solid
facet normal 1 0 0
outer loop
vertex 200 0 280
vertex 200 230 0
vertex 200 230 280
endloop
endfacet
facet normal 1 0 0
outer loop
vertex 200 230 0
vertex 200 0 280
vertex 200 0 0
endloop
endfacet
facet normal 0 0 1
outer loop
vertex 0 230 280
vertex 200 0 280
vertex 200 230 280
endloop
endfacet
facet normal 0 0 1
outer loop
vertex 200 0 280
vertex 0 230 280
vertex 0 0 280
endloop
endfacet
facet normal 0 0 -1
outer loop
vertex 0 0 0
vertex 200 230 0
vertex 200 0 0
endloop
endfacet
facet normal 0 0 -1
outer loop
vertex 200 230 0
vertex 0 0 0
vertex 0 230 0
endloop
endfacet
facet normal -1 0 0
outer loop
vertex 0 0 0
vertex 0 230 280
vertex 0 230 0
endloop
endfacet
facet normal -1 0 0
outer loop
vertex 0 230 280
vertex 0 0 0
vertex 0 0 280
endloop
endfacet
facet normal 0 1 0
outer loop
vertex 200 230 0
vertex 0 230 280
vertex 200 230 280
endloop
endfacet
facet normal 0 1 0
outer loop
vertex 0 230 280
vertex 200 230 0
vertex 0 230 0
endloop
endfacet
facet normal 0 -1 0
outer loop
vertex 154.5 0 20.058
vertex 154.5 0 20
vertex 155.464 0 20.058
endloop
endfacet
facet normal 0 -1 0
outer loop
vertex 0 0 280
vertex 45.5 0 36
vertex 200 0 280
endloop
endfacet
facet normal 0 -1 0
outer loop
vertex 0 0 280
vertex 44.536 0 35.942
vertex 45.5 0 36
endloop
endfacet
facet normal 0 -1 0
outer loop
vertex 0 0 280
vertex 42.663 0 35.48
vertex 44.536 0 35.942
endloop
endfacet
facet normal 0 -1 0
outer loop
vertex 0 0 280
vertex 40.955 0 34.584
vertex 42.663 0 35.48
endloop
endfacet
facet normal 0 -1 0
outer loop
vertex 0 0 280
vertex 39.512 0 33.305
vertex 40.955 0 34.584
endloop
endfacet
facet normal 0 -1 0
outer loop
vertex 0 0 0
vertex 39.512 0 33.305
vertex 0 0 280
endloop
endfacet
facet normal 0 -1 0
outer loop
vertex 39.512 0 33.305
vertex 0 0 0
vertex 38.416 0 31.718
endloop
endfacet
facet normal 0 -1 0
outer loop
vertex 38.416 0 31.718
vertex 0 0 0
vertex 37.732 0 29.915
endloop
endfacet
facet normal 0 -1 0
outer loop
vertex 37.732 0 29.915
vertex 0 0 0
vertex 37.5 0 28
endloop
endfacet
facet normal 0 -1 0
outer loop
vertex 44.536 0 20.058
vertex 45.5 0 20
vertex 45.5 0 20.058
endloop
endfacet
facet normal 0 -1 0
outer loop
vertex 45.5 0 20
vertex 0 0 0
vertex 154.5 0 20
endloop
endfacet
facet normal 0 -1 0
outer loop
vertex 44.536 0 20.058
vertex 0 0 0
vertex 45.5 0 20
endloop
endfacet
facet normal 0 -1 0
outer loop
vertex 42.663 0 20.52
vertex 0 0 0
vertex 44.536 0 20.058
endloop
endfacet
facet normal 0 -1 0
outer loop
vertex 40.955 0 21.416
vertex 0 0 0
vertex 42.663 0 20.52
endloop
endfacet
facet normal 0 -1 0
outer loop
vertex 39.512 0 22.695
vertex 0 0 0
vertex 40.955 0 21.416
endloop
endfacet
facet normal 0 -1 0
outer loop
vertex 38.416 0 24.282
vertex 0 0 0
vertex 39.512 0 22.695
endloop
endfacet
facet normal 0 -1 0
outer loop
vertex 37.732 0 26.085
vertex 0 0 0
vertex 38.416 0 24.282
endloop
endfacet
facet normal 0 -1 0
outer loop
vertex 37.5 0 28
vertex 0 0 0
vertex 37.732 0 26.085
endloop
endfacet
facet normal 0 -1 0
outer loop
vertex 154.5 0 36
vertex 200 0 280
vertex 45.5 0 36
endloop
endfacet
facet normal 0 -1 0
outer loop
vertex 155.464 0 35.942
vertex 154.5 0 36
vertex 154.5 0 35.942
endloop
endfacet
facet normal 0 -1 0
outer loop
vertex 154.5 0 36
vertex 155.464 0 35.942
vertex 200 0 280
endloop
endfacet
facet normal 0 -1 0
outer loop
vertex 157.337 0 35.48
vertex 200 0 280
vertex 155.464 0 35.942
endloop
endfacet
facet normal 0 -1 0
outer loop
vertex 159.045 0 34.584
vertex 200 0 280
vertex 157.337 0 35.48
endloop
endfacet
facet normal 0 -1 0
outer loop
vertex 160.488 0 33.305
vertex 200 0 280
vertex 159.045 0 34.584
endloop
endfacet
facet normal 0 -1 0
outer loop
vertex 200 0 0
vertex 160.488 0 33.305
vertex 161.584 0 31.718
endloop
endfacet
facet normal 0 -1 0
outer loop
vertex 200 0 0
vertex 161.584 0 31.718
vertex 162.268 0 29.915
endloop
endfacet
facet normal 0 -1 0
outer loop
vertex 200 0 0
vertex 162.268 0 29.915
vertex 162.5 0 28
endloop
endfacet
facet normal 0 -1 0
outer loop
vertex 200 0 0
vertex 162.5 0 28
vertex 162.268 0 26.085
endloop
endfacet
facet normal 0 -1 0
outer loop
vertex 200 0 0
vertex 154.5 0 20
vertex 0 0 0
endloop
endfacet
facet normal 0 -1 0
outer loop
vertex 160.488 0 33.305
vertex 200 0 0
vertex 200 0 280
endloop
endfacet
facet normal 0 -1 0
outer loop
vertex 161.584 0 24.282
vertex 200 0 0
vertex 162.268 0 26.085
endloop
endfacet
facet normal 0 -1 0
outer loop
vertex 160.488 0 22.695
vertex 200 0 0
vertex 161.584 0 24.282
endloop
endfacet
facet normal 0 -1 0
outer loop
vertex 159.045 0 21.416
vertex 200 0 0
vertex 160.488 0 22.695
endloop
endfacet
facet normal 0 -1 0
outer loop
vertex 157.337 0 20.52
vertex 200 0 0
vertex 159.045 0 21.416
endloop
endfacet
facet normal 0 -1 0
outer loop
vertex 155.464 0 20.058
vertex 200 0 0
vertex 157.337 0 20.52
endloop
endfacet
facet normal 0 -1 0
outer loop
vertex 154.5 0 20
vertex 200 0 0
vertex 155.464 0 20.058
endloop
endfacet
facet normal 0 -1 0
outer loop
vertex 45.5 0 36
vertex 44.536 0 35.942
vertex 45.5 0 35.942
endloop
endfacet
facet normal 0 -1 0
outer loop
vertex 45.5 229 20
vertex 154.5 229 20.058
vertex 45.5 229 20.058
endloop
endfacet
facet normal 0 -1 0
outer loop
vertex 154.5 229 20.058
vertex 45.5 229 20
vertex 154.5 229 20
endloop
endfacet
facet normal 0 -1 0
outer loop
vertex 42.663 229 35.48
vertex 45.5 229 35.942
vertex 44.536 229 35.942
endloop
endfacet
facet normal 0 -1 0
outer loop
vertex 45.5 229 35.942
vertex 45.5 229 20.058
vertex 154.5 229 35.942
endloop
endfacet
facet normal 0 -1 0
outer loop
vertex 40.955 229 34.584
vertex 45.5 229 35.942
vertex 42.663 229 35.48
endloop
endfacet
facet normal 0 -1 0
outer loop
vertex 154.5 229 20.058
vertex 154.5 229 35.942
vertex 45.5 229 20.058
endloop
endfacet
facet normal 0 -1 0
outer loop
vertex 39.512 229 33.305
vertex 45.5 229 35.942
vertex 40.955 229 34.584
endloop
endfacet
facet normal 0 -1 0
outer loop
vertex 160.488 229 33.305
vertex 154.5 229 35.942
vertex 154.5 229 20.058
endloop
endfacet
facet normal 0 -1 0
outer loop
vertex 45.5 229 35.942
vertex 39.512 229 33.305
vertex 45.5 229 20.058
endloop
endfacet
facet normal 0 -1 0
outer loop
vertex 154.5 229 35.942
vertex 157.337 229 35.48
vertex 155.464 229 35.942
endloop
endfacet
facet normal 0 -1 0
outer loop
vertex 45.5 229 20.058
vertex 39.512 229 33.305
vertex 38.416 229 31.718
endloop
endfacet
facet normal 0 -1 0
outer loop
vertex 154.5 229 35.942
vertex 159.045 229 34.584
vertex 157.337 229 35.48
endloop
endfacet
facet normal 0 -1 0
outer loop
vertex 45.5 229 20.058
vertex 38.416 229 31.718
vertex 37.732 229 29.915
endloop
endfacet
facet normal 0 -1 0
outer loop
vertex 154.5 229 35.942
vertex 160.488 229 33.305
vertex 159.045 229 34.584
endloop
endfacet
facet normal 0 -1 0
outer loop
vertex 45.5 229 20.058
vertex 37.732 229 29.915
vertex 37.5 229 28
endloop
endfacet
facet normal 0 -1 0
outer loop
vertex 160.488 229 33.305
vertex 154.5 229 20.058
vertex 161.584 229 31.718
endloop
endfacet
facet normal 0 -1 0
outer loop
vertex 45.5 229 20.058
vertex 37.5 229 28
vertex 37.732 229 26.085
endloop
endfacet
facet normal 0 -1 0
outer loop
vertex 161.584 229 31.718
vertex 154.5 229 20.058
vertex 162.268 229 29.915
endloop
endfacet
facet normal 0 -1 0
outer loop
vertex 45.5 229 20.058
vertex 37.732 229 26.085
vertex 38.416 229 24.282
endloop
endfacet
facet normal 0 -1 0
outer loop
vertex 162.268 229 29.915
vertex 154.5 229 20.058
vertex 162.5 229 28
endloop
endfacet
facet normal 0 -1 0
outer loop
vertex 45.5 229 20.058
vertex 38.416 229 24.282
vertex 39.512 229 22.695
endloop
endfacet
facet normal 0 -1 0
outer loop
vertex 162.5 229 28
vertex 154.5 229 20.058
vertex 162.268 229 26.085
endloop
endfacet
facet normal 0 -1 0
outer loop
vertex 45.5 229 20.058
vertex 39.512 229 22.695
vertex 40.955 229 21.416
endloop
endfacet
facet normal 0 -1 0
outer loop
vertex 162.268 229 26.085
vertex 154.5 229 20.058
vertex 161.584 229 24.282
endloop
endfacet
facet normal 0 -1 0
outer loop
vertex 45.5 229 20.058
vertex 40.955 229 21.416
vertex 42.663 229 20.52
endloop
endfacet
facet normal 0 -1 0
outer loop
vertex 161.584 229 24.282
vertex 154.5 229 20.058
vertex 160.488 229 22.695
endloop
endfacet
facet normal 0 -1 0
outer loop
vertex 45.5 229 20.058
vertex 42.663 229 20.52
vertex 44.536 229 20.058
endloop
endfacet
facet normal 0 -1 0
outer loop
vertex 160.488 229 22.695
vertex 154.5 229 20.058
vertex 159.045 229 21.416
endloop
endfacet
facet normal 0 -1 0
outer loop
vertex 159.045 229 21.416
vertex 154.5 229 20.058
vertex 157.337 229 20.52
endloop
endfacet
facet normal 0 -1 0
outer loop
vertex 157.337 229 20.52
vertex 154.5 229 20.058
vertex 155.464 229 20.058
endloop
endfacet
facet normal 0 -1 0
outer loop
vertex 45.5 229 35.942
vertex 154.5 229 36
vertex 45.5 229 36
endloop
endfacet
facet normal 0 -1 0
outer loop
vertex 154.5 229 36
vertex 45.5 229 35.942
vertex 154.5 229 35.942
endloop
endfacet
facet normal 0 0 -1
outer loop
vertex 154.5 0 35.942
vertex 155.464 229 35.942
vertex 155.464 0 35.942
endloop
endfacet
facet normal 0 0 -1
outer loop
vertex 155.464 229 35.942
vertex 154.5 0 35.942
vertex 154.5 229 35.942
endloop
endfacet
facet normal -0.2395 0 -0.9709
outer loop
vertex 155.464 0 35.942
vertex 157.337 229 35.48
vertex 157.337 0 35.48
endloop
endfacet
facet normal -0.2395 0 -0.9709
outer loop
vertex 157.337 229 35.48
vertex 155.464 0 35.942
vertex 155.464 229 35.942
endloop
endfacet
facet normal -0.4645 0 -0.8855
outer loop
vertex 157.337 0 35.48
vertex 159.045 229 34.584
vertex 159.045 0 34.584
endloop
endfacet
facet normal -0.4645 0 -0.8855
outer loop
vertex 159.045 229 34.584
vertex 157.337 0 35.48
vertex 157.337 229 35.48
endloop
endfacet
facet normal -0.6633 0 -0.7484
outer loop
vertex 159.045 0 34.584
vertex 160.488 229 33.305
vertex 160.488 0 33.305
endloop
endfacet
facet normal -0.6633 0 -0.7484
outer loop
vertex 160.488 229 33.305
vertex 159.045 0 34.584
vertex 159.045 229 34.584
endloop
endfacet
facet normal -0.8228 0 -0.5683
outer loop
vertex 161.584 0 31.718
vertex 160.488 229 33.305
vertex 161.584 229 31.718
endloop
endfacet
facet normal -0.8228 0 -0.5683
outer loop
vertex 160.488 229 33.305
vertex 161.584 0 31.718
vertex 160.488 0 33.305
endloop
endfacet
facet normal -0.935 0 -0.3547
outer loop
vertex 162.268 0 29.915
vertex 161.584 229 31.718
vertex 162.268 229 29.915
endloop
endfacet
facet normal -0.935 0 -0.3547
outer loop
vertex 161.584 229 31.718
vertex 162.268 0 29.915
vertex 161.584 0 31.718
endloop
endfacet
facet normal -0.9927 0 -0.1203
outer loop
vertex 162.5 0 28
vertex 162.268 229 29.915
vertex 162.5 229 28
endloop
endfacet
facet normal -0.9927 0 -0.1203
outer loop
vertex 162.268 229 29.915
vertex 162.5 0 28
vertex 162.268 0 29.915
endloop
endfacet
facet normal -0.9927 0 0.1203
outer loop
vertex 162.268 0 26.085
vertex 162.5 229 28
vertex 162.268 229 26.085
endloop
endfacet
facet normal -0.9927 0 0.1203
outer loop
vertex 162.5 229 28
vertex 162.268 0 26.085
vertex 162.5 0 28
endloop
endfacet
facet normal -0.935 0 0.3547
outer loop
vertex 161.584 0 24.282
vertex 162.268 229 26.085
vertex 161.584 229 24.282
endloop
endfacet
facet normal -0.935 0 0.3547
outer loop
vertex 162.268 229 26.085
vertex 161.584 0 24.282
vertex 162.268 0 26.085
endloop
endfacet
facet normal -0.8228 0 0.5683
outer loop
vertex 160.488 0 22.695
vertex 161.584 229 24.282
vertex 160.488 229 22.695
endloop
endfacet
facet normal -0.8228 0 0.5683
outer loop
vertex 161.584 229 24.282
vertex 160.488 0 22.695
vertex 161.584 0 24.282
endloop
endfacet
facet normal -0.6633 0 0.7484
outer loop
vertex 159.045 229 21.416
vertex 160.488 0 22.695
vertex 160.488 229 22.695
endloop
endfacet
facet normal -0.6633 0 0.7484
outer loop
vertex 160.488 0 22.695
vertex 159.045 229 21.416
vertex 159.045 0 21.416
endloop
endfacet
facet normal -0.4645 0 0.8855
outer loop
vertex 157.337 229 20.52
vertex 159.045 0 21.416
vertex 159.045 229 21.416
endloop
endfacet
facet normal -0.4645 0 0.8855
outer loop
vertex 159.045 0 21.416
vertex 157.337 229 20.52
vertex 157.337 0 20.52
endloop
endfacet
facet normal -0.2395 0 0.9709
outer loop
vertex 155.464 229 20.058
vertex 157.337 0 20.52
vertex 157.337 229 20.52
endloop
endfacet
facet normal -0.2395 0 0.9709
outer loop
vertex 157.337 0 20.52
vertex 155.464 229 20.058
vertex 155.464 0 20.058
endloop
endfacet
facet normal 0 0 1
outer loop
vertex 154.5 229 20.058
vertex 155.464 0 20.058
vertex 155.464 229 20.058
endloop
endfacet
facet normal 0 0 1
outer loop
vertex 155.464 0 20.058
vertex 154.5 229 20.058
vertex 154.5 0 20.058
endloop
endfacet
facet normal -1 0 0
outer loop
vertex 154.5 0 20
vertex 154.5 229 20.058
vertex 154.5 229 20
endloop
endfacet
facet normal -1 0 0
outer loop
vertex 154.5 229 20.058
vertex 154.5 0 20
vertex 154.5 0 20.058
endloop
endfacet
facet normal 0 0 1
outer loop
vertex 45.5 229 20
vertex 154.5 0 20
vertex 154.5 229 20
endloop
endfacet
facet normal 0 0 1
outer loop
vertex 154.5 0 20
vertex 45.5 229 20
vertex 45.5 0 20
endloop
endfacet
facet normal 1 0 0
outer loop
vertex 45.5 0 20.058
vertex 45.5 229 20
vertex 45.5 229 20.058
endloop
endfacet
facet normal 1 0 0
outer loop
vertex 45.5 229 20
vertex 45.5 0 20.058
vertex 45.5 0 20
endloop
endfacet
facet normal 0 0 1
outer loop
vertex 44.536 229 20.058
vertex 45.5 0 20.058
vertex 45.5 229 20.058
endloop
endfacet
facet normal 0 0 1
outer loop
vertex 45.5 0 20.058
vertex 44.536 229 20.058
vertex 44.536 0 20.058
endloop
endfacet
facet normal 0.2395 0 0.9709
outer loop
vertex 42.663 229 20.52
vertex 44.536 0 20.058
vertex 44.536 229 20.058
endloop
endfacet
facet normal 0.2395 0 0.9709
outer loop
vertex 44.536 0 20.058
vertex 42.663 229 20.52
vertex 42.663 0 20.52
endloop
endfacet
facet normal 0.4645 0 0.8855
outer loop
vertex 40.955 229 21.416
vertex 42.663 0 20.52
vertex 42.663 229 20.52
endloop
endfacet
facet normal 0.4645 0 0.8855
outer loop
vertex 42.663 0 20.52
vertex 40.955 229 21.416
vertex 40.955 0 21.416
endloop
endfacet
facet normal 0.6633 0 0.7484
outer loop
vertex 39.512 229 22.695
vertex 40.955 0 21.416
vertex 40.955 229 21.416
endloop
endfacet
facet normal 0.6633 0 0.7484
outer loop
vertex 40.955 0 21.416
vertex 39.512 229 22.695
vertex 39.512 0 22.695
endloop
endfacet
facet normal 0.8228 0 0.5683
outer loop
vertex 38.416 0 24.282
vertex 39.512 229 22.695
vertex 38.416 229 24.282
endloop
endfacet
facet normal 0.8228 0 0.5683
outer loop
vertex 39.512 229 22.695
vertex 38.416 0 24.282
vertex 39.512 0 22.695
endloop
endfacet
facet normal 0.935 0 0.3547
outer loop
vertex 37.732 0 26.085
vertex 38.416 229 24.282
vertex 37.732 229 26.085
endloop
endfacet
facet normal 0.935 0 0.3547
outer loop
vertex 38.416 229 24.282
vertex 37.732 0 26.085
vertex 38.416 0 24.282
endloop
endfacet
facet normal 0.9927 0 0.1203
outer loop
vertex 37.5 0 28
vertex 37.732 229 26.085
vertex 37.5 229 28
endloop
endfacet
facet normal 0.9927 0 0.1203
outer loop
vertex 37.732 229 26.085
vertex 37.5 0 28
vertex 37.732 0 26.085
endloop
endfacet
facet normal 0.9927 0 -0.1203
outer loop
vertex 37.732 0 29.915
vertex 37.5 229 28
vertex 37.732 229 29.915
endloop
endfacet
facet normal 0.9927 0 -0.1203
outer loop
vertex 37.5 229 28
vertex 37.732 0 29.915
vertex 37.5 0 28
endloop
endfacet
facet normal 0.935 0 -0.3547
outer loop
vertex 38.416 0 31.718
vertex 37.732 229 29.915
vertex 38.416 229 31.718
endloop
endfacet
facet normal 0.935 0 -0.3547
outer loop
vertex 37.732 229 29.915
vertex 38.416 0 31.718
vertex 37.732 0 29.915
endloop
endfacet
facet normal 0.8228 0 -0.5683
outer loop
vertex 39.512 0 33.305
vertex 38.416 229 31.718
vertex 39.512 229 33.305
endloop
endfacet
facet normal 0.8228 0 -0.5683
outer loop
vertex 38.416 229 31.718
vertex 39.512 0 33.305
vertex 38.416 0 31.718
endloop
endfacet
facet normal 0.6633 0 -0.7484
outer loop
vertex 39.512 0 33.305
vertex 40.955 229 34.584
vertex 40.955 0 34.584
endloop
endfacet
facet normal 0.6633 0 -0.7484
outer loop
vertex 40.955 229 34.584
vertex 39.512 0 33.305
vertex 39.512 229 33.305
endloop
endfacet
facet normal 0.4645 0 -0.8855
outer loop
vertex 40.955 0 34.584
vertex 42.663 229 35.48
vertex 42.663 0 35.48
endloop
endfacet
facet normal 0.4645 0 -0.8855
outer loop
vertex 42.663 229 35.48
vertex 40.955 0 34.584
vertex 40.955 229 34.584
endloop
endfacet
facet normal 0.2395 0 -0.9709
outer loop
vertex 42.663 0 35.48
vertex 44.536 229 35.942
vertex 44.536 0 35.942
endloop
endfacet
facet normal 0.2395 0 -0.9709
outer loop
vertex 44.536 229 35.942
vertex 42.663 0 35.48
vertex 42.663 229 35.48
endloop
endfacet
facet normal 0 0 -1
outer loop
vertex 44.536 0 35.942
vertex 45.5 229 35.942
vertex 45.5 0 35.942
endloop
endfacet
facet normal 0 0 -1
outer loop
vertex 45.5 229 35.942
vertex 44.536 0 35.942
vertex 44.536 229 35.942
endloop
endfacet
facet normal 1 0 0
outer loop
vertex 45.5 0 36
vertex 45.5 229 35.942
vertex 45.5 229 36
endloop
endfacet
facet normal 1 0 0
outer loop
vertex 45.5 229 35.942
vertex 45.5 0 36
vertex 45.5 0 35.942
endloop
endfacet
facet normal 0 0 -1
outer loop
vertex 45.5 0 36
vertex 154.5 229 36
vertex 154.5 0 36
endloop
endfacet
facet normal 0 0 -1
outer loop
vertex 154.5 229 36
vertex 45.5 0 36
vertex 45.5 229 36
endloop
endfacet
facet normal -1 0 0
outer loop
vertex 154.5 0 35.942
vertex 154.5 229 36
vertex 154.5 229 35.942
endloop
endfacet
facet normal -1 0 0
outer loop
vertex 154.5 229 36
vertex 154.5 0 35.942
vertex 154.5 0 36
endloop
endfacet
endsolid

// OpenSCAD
module rounded_frontal_bass_port(width, depth, radius) {
  linear_extrude(depth) union() {
    translate([ radius, radius, 0 ]) circle(r = radius);
    translate(v = [ radius, 0, 0 ])
        square([ width - radius * 2, radius * 2 ]);
    translate(v = [ width - radius, radius, 0 ]) circle(r = radius);
  }
}

function presonus_eris_e5xt_width() = 200;
function presonus_eris_e5xt_height() = 280;
function presonus_eris_e5xt_depth() = 230;

module presonus_eris_e5xt() {
  width = presonus_eris_e5xt_width();
  height = presonus_eris_e5xt_height();
  depth = presonus_eris_e5xt_depth();

  module enclosure() {
    difference() {
      bass_port_width = 125;
      bass_port_depth = depth;
      bass_port_radius = 8;
      cube([ width, depth, height ]);
      translate(v =
                    [
                      (width - bass_port_width) / 2, -1, 20 + 2 *
                      bass_port_radius
                    ]) rotate(a = [ -90, 0, 0 ]) color("black")
          rounded_frontal_bass_port(bass_port_width, bass_port_depth,
                                    bass_port_radius);
    }
  }

  union() {
    enclosure();
    translate([ width / 2, 0, height / 2 ]) rotate([ 90, 0, 0 ])
        color("white") text("PreSonus Eris E5 XT", halign = "center",
                            valign = "center");
  }
}

presonus_eris_e5xt();

module put_on_stand(height) {
  translate([ 0, 0, height ]) children();
  translate([ 30, 30, 0 ]) cylinder(h = height, r = 10);
  translate([ 200 - 30, 30, 0 ]) cylinder(h = height, r = 10);
  translate([ 30, 200, 0 ]) cylinder(h = height, r = 10);
  translate([ 200 - 30, 200, 0 ]) cylinder(h = height, r = 10);
}
